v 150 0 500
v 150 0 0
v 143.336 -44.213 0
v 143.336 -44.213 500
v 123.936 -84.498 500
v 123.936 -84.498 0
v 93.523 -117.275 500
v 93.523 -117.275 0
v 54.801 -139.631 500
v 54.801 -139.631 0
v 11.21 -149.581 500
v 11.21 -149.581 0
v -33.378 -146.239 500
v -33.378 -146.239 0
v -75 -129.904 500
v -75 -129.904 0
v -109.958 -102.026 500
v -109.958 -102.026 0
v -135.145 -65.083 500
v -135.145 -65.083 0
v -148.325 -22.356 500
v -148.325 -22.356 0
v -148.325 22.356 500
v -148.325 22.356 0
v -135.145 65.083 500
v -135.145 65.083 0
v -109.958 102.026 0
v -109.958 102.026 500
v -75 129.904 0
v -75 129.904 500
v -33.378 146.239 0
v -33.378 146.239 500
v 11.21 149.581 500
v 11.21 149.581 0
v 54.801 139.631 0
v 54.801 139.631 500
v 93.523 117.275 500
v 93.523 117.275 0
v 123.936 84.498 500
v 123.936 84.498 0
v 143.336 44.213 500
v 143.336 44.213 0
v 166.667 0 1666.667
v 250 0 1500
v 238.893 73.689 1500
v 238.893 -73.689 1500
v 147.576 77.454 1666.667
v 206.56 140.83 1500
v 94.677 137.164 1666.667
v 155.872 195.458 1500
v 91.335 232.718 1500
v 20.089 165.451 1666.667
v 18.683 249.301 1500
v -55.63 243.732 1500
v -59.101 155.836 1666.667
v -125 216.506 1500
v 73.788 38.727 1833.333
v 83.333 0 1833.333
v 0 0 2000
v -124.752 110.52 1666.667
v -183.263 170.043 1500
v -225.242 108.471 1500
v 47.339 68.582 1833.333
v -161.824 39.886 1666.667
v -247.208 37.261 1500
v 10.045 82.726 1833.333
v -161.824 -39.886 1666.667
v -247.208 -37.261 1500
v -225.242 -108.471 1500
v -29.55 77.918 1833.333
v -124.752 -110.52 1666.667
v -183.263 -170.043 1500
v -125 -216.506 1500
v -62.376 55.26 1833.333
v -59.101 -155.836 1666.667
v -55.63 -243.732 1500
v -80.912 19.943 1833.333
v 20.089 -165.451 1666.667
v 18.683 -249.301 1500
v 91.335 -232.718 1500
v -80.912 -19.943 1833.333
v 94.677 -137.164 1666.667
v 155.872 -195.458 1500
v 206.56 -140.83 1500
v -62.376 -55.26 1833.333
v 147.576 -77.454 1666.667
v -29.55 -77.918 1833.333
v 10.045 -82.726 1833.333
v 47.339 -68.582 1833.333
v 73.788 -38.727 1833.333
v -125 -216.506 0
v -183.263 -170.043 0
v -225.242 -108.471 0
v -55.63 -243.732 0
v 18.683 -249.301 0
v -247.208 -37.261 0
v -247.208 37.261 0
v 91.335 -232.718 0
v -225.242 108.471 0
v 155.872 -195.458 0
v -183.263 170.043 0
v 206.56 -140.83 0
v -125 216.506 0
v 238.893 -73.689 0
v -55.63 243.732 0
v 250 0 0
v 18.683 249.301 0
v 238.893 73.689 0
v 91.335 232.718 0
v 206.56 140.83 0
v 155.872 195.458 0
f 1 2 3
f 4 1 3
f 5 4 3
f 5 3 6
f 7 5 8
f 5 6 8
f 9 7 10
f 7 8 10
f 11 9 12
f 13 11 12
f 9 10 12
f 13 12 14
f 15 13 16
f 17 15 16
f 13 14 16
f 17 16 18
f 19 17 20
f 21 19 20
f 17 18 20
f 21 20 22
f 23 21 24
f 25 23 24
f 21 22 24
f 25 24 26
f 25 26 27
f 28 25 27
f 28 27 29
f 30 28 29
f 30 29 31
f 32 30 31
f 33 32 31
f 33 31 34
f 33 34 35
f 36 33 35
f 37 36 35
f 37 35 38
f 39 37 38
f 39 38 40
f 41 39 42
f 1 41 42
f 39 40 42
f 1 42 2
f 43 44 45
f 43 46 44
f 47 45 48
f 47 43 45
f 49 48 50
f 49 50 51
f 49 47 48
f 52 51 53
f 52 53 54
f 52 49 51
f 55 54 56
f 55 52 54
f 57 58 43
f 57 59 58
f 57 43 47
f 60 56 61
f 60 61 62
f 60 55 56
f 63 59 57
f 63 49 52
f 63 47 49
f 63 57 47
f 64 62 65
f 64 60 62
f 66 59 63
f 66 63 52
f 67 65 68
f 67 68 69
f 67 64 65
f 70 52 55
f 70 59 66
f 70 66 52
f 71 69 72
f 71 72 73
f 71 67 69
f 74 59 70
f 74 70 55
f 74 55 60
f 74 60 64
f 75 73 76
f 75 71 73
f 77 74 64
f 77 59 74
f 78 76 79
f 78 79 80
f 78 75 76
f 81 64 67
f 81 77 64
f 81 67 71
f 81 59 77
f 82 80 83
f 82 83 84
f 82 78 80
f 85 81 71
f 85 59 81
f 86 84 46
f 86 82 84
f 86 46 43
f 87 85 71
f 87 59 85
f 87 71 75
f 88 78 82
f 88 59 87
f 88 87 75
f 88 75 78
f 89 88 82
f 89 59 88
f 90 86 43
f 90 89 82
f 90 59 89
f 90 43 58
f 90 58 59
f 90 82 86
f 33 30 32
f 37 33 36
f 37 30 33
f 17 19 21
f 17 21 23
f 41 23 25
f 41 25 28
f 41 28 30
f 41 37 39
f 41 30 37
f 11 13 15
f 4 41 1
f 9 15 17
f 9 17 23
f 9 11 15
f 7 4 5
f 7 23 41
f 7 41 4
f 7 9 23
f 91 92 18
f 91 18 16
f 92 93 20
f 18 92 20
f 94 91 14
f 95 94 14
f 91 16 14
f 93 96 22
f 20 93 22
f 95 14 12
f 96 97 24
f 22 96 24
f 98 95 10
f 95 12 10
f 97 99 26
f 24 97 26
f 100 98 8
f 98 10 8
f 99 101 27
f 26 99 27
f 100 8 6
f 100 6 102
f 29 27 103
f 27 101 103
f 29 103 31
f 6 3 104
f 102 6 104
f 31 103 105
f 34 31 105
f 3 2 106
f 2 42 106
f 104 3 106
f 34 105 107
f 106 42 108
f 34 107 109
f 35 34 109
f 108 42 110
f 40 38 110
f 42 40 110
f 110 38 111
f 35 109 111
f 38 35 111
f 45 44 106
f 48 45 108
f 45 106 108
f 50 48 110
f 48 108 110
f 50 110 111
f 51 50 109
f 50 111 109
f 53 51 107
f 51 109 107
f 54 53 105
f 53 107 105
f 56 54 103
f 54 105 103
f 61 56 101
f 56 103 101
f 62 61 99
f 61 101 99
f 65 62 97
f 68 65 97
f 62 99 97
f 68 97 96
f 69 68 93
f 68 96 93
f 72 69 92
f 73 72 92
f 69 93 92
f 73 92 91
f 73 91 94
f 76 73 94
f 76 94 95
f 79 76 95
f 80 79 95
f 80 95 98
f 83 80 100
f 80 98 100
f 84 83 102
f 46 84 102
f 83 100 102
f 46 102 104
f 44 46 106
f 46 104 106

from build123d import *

# Parameters (mm, degrees)
F0_R     = 250
F1_DEPTH = 1500
F4_R     = 150
F5_DEPTH = 500


with BuildPart() as f1:
    # F0 (on Top) → F1 (new body)
    with BuildSketch(Plane.XY):
        Circle(F0_R)
    extrude(amount=F1_DEPTH)

    # F2 (on Front) → F3 (revolve)
    with BuildSketch(Plane.XZ):
        Polygon((0, 2000), (0, 1500), (250, 1500), align=None)
    revolve(axis=Axis((0, 0, 1750), (0, 0, 1)))

    # F4 (on face) → F5 (cut)
    with BuildSketch(Plane(origin=(0, 0, 0), x_dir=(1, 0, 0), z_dir=(0, 0, -1))):
        Circle(F4_R)
    extrude(amount=-F5_DEPTH, mode=Mode.SUBTRACT)


solid = f1.part
